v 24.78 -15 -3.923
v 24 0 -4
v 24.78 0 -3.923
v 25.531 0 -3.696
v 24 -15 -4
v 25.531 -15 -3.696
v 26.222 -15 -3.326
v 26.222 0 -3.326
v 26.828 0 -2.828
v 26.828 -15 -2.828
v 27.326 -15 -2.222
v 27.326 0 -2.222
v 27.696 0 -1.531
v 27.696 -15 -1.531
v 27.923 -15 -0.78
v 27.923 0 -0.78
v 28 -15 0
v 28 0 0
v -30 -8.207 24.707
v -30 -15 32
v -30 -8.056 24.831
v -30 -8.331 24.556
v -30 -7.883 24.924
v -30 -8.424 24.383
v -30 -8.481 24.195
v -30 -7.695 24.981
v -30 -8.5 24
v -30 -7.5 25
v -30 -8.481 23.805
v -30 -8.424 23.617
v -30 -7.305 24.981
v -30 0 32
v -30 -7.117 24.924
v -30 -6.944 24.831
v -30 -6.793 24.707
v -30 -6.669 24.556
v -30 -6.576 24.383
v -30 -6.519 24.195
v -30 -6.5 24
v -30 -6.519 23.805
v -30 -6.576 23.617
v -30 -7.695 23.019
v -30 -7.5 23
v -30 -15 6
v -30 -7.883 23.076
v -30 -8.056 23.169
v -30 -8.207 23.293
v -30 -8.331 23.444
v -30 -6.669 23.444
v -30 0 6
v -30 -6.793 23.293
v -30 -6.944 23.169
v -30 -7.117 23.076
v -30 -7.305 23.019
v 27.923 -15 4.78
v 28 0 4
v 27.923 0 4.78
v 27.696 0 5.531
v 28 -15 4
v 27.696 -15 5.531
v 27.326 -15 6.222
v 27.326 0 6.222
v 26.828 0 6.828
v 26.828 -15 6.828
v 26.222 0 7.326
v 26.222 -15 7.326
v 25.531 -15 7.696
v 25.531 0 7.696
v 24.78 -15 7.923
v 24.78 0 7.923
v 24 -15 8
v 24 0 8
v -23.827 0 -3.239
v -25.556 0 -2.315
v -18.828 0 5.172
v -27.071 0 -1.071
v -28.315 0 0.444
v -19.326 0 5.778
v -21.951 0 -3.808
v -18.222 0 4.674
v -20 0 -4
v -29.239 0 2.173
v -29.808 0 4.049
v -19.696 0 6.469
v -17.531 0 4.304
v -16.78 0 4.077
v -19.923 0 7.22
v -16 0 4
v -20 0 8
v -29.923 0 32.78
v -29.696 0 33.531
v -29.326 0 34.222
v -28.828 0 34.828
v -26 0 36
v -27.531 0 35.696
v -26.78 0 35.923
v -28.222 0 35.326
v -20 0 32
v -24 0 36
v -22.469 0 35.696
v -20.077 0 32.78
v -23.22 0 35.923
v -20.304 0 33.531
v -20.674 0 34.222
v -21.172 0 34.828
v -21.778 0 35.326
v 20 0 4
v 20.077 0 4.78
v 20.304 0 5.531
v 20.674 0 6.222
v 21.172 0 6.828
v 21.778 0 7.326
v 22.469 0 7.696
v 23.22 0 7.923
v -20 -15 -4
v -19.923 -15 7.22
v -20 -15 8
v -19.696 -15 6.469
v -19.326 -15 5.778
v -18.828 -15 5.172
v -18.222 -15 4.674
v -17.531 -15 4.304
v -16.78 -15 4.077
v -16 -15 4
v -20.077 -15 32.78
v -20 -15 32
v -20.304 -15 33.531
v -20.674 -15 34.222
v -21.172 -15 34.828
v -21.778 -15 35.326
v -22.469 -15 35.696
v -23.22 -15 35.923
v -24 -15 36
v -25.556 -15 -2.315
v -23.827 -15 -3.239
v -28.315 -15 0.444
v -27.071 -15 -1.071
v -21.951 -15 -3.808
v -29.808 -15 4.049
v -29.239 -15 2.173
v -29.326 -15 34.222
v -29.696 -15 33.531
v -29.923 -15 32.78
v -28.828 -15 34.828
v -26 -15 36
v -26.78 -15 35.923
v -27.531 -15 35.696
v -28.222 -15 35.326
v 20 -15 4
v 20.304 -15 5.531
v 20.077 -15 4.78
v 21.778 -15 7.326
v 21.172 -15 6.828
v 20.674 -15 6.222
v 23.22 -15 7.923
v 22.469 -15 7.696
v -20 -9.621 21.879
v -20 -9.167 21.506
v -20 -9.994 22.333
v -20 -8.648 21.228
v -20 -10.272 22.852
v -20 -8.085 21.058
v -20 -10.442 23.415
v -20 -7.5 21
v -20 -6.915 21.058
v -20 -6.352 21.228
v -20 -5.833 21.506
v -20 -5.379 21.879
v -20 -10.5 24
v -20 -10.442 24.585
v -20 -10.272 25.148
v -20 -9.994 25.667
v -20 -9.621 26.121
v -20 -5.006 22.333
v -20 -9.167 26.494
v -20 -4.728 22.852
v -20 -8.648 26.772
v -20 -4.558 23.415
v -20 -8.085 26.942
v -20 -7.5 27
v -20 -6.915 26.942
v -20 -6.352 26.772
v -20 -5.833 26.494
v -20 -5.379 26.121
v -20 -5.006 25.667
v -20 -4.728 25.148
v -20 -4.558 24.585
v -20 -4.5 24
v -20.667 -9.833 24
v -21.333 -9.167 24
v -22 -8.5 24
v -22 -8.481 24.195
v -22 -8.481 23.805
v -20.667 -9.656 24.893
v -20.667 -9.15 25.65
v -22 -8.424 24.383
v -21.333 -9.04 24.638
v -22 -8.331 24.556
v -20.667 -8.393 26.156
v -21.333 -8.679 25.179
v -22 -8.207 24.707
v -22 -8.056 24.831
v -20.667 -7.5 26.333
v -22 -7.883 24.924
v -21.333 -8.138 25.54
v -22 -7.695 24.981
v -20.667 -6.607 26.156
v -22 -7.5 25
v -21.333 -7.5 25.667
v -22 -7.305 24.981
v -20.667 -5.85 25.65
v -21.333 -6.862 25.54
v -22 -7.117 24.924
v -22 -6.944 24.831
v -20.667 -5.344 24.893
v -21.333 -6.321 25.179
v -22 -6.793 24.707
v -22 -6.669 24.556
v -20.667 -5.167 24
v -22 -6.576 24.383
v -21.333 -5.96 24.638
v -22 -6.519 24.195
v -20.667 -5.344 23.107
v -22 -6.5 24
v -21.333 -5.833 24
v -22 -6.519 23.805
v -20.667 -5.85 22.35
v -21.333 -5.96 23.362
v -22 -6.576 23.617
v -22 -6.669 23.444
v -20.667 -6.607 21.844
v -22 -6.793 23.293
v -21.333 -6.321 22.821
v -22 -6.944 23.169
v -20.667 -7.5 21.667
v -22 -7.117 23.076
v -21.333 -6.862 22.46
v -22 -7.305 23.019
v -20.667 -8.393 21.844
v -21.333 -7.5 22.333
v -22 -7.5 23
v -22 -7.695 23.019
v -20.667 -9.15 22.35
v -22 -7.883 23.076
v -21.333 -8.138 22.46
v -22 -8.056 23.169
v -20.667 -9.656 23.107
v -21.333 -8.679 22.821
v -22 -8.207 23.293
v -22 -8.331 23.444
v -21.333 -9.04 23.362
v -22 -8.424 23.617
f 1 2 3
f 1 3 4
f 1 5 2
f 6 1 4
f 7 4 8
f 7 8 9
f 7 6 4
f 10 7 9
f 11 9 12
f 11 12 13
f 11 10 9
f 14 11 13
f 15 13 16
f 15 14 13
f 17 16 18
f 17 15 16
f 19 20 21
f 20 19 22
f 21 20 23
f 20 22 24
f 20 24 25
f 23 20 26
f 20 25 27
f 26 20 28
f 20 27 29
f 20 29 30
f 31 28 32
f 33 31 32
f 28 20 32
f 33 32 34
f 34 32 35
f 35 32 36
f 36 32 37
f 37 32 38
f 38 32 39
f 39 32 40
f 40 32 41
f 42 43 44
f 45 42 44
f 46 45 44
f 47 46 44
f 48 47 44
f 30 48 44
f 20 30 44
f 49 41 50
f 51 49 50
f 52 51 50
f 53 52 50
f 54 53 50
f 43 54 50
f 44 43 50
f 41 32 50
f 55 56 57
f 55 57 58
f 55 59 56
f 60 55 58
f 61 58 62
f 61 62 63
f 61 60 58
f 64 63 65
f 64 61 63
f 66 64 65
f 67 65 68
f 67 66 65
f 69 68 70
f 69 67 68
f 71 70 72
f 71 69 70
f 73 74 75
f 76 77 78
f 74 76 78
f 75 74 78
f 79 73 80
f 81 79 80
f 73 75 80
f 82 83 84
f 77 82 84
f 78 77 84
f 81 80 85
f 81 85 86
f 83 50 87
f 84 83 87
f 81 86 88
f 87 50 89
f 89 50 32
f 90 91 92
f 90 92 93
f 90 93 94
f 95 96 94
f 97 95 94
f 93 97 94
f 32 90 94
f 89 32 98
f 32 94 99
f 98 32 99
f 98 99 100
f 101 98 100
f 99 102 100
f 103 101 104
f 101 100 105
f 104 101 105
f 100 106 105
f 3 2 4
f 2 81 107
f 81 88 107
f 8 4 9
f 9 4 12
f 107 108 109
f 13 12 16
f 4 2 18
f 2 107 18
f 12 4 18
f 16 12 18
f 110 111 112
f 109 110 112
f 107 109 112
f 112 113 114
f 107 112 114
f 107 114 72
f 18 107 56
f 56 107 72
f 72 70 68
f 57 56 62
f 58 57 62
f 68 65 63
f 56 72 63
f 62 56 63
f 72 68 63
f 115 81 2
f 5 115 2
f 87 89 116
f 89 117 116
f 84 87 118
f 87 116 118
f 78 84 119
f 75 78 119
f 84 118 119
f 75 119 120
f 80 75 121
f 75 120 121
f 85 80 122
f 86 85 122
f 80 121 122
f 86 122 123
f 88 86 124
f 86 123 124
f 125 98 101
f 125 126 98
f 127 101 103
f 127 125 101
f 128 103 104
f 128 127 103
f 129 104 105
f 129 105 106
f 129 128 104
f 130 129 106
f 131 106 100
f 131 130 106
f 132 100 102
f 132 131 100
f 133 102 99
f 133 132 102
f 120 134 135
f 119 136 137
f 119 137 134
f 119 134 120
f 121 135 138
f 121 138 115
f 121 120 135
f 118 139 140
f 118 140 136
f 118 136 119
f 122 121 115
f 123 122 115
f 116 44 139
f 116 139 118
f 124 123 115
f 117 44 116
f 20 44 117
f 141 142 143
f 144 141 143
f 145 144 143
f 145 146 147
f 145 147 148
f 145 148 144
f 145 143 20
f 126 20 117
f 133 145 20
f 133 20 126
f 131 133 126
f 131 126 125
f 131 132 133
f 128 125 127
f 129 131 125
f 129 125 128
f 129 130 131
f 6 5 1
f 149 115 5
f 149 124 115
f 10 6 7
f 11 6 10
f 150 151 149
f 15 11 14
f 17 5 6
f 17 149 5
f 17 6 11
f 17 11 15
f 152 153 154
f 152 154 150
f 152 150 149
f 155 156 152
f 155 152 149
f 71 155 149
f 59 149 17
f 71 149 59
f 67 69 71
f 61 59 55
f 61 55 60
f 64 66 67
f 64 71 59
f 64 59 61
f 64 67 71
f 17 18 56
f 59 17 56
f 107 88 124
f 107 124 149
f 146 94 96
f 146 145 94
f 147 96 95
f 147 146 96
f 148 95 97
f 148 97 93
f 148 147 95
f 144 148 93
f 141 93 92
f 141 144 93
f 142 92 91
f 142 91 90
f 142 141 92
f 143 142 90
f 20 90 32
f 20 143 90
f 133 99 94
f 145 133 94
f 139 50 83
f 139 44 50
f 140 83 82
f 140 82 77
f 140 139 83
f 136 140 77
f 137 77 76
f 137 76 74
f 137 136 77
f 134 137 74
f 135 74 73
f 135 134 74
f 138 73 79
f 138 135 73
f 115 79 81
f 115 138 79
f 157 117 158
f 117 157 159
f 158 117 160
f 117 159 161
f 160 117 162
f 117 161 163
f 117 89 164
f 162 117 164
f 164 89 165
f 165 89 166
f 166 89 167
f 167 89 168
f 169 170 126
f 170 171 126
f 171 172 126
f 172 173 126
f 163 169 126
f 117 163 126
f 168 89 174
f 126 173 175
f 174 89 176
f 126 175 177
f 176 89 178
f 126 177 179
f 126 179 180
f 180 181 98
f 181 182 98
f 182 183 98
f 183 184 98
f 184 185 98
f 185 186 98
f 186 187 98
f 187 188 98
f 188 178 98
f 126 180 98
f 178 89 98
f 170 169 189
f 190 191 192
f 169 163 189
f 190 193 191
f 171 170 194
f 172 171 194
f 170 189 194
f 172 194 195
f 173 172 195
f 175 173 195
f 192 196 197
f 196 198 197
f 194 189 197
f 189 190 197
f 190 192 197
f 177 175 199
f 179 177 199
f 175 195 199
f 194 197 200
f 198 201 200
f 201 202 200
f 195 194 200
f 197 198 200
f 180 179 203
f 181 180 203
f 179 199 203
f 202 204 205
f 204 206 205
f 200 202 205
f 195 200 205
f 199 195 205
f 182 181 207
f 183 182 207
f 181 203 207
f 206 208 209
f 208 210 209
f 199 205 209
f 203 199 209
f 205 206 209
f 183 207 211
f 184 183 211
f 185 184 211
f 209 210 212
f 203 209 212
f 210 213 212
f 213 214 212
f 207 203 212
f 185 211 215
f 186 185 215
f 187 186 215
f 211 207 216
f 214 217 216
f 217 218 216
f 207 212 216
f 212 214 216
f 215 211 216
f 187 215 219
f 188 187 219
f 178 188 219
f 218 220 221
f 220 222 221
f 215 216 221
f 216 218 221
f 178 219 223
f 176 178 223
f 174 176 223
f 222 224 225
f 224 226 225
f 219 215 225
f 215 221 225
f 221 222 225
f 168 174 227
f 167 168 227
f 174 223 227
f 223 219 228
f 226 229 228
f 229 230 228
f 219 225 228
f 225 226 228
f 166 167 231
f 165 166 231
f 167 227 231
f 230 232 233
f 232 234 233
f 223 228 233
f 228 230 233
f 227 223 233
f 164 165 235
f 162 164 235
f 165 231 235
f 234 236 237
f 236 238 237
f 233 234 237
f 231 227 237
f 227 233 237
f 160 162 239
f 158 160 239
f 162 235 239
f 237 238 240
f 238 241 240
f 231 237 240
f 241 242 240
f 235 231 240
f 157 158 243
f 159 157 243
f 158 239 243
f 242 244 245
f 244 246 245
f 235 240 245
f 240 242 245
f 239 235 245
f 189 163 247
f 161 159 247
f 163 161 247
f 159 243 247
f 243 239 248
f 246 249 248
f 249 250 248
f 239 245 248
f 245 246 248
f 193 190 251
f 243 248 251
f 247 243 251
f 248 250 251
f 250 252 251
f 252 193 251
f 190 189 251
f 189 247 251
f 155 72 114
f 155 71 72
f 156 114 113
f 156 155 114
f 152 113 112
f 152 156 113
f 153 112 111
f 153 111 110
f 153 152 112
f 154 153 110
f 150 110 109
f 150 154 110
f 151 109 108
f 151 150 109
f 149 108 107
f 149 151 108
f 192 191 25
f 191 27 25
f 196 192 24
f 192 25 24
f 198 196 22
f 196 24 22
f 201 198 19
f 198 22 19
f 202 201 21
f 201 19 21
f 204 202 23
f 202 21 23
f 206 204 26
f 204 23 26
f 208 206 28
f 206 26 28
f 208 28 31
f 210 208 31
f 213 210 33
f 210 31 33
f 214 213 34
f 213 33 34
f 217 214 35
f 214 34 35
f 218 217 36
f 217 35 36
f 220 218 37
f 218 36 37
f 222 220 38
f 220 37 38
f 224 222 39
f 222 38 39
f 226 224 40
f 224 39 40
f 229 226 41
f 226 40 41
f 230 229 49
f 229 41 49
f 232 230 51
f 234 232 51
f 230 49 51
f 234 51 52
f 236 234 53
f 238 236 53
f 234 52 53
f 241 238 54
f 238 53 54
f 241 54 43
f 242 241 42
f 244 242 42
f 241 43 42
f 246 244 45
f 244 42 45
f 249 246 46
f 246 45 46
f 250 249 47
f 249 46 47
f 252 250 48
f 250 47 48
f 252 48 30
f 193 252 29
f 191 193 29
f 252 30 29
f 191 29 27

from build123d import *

# Parameters (mm, degrees)
F0_W           = 40
F0_H           = 8
F1_DEPTH       = 15
F2_R           = 3.99999
F3_R           = 10
F5_D           = 2
F5_CSINK_D     = 6
F5_CSINK_ANGLE = 90


# Not quite as in the source:
# - a fillet or chamfer is up to 0.001 mm smaller than in the source, because OpenCascade refuses the exact size


with BuildPart() as f1:
    # F0 (on Front) → F1 (new body)
    with BuildSketch(Plane.XZ):
        Polygon((-20, -4), (-20, 4), (-20, 36), (-30, 36), (-30, -4), align=None)
        Rectangle(F0_W, F0_H)
        Polygon((20, 8), (20, 4), (20, -4), (28, -4), (28, 8), align=None)
    extrude(amount=F1_DEPTH)

    # F2 (radius 4 in the source; OpenCascade refuses exactly that, so slightly less here)
    f2_edges = [f1.edges().sort_by_distance(p)[0] for p in [
        (-20, -7.5, 4),
        (20, -7.5, 8),
        (28, -7.5, 8),
        (28, -7.5, -4),
        (-20, -7.5, 36),
        (-30, -7.5, 36),
    ]]
    fillet(f2_edges, radius=F2_R)

    # F3
    f3_edges = [f1.edges().sort_by_distance(p)[0] for p in [
        (-30, -7.5, -4),
    ]]
    fillet(f3_edges, radius=F3_R)

    # F5 (through all)
    with Locations(Plane.YZ.offset(-20)):
        with Locations((-7.5, 24)):
            CounterSinkHole(F5_D / 2, F5_CSINK_D / 2, counter_sink_angle=F5_CSINK_ANGLE)


solid = f1.part
